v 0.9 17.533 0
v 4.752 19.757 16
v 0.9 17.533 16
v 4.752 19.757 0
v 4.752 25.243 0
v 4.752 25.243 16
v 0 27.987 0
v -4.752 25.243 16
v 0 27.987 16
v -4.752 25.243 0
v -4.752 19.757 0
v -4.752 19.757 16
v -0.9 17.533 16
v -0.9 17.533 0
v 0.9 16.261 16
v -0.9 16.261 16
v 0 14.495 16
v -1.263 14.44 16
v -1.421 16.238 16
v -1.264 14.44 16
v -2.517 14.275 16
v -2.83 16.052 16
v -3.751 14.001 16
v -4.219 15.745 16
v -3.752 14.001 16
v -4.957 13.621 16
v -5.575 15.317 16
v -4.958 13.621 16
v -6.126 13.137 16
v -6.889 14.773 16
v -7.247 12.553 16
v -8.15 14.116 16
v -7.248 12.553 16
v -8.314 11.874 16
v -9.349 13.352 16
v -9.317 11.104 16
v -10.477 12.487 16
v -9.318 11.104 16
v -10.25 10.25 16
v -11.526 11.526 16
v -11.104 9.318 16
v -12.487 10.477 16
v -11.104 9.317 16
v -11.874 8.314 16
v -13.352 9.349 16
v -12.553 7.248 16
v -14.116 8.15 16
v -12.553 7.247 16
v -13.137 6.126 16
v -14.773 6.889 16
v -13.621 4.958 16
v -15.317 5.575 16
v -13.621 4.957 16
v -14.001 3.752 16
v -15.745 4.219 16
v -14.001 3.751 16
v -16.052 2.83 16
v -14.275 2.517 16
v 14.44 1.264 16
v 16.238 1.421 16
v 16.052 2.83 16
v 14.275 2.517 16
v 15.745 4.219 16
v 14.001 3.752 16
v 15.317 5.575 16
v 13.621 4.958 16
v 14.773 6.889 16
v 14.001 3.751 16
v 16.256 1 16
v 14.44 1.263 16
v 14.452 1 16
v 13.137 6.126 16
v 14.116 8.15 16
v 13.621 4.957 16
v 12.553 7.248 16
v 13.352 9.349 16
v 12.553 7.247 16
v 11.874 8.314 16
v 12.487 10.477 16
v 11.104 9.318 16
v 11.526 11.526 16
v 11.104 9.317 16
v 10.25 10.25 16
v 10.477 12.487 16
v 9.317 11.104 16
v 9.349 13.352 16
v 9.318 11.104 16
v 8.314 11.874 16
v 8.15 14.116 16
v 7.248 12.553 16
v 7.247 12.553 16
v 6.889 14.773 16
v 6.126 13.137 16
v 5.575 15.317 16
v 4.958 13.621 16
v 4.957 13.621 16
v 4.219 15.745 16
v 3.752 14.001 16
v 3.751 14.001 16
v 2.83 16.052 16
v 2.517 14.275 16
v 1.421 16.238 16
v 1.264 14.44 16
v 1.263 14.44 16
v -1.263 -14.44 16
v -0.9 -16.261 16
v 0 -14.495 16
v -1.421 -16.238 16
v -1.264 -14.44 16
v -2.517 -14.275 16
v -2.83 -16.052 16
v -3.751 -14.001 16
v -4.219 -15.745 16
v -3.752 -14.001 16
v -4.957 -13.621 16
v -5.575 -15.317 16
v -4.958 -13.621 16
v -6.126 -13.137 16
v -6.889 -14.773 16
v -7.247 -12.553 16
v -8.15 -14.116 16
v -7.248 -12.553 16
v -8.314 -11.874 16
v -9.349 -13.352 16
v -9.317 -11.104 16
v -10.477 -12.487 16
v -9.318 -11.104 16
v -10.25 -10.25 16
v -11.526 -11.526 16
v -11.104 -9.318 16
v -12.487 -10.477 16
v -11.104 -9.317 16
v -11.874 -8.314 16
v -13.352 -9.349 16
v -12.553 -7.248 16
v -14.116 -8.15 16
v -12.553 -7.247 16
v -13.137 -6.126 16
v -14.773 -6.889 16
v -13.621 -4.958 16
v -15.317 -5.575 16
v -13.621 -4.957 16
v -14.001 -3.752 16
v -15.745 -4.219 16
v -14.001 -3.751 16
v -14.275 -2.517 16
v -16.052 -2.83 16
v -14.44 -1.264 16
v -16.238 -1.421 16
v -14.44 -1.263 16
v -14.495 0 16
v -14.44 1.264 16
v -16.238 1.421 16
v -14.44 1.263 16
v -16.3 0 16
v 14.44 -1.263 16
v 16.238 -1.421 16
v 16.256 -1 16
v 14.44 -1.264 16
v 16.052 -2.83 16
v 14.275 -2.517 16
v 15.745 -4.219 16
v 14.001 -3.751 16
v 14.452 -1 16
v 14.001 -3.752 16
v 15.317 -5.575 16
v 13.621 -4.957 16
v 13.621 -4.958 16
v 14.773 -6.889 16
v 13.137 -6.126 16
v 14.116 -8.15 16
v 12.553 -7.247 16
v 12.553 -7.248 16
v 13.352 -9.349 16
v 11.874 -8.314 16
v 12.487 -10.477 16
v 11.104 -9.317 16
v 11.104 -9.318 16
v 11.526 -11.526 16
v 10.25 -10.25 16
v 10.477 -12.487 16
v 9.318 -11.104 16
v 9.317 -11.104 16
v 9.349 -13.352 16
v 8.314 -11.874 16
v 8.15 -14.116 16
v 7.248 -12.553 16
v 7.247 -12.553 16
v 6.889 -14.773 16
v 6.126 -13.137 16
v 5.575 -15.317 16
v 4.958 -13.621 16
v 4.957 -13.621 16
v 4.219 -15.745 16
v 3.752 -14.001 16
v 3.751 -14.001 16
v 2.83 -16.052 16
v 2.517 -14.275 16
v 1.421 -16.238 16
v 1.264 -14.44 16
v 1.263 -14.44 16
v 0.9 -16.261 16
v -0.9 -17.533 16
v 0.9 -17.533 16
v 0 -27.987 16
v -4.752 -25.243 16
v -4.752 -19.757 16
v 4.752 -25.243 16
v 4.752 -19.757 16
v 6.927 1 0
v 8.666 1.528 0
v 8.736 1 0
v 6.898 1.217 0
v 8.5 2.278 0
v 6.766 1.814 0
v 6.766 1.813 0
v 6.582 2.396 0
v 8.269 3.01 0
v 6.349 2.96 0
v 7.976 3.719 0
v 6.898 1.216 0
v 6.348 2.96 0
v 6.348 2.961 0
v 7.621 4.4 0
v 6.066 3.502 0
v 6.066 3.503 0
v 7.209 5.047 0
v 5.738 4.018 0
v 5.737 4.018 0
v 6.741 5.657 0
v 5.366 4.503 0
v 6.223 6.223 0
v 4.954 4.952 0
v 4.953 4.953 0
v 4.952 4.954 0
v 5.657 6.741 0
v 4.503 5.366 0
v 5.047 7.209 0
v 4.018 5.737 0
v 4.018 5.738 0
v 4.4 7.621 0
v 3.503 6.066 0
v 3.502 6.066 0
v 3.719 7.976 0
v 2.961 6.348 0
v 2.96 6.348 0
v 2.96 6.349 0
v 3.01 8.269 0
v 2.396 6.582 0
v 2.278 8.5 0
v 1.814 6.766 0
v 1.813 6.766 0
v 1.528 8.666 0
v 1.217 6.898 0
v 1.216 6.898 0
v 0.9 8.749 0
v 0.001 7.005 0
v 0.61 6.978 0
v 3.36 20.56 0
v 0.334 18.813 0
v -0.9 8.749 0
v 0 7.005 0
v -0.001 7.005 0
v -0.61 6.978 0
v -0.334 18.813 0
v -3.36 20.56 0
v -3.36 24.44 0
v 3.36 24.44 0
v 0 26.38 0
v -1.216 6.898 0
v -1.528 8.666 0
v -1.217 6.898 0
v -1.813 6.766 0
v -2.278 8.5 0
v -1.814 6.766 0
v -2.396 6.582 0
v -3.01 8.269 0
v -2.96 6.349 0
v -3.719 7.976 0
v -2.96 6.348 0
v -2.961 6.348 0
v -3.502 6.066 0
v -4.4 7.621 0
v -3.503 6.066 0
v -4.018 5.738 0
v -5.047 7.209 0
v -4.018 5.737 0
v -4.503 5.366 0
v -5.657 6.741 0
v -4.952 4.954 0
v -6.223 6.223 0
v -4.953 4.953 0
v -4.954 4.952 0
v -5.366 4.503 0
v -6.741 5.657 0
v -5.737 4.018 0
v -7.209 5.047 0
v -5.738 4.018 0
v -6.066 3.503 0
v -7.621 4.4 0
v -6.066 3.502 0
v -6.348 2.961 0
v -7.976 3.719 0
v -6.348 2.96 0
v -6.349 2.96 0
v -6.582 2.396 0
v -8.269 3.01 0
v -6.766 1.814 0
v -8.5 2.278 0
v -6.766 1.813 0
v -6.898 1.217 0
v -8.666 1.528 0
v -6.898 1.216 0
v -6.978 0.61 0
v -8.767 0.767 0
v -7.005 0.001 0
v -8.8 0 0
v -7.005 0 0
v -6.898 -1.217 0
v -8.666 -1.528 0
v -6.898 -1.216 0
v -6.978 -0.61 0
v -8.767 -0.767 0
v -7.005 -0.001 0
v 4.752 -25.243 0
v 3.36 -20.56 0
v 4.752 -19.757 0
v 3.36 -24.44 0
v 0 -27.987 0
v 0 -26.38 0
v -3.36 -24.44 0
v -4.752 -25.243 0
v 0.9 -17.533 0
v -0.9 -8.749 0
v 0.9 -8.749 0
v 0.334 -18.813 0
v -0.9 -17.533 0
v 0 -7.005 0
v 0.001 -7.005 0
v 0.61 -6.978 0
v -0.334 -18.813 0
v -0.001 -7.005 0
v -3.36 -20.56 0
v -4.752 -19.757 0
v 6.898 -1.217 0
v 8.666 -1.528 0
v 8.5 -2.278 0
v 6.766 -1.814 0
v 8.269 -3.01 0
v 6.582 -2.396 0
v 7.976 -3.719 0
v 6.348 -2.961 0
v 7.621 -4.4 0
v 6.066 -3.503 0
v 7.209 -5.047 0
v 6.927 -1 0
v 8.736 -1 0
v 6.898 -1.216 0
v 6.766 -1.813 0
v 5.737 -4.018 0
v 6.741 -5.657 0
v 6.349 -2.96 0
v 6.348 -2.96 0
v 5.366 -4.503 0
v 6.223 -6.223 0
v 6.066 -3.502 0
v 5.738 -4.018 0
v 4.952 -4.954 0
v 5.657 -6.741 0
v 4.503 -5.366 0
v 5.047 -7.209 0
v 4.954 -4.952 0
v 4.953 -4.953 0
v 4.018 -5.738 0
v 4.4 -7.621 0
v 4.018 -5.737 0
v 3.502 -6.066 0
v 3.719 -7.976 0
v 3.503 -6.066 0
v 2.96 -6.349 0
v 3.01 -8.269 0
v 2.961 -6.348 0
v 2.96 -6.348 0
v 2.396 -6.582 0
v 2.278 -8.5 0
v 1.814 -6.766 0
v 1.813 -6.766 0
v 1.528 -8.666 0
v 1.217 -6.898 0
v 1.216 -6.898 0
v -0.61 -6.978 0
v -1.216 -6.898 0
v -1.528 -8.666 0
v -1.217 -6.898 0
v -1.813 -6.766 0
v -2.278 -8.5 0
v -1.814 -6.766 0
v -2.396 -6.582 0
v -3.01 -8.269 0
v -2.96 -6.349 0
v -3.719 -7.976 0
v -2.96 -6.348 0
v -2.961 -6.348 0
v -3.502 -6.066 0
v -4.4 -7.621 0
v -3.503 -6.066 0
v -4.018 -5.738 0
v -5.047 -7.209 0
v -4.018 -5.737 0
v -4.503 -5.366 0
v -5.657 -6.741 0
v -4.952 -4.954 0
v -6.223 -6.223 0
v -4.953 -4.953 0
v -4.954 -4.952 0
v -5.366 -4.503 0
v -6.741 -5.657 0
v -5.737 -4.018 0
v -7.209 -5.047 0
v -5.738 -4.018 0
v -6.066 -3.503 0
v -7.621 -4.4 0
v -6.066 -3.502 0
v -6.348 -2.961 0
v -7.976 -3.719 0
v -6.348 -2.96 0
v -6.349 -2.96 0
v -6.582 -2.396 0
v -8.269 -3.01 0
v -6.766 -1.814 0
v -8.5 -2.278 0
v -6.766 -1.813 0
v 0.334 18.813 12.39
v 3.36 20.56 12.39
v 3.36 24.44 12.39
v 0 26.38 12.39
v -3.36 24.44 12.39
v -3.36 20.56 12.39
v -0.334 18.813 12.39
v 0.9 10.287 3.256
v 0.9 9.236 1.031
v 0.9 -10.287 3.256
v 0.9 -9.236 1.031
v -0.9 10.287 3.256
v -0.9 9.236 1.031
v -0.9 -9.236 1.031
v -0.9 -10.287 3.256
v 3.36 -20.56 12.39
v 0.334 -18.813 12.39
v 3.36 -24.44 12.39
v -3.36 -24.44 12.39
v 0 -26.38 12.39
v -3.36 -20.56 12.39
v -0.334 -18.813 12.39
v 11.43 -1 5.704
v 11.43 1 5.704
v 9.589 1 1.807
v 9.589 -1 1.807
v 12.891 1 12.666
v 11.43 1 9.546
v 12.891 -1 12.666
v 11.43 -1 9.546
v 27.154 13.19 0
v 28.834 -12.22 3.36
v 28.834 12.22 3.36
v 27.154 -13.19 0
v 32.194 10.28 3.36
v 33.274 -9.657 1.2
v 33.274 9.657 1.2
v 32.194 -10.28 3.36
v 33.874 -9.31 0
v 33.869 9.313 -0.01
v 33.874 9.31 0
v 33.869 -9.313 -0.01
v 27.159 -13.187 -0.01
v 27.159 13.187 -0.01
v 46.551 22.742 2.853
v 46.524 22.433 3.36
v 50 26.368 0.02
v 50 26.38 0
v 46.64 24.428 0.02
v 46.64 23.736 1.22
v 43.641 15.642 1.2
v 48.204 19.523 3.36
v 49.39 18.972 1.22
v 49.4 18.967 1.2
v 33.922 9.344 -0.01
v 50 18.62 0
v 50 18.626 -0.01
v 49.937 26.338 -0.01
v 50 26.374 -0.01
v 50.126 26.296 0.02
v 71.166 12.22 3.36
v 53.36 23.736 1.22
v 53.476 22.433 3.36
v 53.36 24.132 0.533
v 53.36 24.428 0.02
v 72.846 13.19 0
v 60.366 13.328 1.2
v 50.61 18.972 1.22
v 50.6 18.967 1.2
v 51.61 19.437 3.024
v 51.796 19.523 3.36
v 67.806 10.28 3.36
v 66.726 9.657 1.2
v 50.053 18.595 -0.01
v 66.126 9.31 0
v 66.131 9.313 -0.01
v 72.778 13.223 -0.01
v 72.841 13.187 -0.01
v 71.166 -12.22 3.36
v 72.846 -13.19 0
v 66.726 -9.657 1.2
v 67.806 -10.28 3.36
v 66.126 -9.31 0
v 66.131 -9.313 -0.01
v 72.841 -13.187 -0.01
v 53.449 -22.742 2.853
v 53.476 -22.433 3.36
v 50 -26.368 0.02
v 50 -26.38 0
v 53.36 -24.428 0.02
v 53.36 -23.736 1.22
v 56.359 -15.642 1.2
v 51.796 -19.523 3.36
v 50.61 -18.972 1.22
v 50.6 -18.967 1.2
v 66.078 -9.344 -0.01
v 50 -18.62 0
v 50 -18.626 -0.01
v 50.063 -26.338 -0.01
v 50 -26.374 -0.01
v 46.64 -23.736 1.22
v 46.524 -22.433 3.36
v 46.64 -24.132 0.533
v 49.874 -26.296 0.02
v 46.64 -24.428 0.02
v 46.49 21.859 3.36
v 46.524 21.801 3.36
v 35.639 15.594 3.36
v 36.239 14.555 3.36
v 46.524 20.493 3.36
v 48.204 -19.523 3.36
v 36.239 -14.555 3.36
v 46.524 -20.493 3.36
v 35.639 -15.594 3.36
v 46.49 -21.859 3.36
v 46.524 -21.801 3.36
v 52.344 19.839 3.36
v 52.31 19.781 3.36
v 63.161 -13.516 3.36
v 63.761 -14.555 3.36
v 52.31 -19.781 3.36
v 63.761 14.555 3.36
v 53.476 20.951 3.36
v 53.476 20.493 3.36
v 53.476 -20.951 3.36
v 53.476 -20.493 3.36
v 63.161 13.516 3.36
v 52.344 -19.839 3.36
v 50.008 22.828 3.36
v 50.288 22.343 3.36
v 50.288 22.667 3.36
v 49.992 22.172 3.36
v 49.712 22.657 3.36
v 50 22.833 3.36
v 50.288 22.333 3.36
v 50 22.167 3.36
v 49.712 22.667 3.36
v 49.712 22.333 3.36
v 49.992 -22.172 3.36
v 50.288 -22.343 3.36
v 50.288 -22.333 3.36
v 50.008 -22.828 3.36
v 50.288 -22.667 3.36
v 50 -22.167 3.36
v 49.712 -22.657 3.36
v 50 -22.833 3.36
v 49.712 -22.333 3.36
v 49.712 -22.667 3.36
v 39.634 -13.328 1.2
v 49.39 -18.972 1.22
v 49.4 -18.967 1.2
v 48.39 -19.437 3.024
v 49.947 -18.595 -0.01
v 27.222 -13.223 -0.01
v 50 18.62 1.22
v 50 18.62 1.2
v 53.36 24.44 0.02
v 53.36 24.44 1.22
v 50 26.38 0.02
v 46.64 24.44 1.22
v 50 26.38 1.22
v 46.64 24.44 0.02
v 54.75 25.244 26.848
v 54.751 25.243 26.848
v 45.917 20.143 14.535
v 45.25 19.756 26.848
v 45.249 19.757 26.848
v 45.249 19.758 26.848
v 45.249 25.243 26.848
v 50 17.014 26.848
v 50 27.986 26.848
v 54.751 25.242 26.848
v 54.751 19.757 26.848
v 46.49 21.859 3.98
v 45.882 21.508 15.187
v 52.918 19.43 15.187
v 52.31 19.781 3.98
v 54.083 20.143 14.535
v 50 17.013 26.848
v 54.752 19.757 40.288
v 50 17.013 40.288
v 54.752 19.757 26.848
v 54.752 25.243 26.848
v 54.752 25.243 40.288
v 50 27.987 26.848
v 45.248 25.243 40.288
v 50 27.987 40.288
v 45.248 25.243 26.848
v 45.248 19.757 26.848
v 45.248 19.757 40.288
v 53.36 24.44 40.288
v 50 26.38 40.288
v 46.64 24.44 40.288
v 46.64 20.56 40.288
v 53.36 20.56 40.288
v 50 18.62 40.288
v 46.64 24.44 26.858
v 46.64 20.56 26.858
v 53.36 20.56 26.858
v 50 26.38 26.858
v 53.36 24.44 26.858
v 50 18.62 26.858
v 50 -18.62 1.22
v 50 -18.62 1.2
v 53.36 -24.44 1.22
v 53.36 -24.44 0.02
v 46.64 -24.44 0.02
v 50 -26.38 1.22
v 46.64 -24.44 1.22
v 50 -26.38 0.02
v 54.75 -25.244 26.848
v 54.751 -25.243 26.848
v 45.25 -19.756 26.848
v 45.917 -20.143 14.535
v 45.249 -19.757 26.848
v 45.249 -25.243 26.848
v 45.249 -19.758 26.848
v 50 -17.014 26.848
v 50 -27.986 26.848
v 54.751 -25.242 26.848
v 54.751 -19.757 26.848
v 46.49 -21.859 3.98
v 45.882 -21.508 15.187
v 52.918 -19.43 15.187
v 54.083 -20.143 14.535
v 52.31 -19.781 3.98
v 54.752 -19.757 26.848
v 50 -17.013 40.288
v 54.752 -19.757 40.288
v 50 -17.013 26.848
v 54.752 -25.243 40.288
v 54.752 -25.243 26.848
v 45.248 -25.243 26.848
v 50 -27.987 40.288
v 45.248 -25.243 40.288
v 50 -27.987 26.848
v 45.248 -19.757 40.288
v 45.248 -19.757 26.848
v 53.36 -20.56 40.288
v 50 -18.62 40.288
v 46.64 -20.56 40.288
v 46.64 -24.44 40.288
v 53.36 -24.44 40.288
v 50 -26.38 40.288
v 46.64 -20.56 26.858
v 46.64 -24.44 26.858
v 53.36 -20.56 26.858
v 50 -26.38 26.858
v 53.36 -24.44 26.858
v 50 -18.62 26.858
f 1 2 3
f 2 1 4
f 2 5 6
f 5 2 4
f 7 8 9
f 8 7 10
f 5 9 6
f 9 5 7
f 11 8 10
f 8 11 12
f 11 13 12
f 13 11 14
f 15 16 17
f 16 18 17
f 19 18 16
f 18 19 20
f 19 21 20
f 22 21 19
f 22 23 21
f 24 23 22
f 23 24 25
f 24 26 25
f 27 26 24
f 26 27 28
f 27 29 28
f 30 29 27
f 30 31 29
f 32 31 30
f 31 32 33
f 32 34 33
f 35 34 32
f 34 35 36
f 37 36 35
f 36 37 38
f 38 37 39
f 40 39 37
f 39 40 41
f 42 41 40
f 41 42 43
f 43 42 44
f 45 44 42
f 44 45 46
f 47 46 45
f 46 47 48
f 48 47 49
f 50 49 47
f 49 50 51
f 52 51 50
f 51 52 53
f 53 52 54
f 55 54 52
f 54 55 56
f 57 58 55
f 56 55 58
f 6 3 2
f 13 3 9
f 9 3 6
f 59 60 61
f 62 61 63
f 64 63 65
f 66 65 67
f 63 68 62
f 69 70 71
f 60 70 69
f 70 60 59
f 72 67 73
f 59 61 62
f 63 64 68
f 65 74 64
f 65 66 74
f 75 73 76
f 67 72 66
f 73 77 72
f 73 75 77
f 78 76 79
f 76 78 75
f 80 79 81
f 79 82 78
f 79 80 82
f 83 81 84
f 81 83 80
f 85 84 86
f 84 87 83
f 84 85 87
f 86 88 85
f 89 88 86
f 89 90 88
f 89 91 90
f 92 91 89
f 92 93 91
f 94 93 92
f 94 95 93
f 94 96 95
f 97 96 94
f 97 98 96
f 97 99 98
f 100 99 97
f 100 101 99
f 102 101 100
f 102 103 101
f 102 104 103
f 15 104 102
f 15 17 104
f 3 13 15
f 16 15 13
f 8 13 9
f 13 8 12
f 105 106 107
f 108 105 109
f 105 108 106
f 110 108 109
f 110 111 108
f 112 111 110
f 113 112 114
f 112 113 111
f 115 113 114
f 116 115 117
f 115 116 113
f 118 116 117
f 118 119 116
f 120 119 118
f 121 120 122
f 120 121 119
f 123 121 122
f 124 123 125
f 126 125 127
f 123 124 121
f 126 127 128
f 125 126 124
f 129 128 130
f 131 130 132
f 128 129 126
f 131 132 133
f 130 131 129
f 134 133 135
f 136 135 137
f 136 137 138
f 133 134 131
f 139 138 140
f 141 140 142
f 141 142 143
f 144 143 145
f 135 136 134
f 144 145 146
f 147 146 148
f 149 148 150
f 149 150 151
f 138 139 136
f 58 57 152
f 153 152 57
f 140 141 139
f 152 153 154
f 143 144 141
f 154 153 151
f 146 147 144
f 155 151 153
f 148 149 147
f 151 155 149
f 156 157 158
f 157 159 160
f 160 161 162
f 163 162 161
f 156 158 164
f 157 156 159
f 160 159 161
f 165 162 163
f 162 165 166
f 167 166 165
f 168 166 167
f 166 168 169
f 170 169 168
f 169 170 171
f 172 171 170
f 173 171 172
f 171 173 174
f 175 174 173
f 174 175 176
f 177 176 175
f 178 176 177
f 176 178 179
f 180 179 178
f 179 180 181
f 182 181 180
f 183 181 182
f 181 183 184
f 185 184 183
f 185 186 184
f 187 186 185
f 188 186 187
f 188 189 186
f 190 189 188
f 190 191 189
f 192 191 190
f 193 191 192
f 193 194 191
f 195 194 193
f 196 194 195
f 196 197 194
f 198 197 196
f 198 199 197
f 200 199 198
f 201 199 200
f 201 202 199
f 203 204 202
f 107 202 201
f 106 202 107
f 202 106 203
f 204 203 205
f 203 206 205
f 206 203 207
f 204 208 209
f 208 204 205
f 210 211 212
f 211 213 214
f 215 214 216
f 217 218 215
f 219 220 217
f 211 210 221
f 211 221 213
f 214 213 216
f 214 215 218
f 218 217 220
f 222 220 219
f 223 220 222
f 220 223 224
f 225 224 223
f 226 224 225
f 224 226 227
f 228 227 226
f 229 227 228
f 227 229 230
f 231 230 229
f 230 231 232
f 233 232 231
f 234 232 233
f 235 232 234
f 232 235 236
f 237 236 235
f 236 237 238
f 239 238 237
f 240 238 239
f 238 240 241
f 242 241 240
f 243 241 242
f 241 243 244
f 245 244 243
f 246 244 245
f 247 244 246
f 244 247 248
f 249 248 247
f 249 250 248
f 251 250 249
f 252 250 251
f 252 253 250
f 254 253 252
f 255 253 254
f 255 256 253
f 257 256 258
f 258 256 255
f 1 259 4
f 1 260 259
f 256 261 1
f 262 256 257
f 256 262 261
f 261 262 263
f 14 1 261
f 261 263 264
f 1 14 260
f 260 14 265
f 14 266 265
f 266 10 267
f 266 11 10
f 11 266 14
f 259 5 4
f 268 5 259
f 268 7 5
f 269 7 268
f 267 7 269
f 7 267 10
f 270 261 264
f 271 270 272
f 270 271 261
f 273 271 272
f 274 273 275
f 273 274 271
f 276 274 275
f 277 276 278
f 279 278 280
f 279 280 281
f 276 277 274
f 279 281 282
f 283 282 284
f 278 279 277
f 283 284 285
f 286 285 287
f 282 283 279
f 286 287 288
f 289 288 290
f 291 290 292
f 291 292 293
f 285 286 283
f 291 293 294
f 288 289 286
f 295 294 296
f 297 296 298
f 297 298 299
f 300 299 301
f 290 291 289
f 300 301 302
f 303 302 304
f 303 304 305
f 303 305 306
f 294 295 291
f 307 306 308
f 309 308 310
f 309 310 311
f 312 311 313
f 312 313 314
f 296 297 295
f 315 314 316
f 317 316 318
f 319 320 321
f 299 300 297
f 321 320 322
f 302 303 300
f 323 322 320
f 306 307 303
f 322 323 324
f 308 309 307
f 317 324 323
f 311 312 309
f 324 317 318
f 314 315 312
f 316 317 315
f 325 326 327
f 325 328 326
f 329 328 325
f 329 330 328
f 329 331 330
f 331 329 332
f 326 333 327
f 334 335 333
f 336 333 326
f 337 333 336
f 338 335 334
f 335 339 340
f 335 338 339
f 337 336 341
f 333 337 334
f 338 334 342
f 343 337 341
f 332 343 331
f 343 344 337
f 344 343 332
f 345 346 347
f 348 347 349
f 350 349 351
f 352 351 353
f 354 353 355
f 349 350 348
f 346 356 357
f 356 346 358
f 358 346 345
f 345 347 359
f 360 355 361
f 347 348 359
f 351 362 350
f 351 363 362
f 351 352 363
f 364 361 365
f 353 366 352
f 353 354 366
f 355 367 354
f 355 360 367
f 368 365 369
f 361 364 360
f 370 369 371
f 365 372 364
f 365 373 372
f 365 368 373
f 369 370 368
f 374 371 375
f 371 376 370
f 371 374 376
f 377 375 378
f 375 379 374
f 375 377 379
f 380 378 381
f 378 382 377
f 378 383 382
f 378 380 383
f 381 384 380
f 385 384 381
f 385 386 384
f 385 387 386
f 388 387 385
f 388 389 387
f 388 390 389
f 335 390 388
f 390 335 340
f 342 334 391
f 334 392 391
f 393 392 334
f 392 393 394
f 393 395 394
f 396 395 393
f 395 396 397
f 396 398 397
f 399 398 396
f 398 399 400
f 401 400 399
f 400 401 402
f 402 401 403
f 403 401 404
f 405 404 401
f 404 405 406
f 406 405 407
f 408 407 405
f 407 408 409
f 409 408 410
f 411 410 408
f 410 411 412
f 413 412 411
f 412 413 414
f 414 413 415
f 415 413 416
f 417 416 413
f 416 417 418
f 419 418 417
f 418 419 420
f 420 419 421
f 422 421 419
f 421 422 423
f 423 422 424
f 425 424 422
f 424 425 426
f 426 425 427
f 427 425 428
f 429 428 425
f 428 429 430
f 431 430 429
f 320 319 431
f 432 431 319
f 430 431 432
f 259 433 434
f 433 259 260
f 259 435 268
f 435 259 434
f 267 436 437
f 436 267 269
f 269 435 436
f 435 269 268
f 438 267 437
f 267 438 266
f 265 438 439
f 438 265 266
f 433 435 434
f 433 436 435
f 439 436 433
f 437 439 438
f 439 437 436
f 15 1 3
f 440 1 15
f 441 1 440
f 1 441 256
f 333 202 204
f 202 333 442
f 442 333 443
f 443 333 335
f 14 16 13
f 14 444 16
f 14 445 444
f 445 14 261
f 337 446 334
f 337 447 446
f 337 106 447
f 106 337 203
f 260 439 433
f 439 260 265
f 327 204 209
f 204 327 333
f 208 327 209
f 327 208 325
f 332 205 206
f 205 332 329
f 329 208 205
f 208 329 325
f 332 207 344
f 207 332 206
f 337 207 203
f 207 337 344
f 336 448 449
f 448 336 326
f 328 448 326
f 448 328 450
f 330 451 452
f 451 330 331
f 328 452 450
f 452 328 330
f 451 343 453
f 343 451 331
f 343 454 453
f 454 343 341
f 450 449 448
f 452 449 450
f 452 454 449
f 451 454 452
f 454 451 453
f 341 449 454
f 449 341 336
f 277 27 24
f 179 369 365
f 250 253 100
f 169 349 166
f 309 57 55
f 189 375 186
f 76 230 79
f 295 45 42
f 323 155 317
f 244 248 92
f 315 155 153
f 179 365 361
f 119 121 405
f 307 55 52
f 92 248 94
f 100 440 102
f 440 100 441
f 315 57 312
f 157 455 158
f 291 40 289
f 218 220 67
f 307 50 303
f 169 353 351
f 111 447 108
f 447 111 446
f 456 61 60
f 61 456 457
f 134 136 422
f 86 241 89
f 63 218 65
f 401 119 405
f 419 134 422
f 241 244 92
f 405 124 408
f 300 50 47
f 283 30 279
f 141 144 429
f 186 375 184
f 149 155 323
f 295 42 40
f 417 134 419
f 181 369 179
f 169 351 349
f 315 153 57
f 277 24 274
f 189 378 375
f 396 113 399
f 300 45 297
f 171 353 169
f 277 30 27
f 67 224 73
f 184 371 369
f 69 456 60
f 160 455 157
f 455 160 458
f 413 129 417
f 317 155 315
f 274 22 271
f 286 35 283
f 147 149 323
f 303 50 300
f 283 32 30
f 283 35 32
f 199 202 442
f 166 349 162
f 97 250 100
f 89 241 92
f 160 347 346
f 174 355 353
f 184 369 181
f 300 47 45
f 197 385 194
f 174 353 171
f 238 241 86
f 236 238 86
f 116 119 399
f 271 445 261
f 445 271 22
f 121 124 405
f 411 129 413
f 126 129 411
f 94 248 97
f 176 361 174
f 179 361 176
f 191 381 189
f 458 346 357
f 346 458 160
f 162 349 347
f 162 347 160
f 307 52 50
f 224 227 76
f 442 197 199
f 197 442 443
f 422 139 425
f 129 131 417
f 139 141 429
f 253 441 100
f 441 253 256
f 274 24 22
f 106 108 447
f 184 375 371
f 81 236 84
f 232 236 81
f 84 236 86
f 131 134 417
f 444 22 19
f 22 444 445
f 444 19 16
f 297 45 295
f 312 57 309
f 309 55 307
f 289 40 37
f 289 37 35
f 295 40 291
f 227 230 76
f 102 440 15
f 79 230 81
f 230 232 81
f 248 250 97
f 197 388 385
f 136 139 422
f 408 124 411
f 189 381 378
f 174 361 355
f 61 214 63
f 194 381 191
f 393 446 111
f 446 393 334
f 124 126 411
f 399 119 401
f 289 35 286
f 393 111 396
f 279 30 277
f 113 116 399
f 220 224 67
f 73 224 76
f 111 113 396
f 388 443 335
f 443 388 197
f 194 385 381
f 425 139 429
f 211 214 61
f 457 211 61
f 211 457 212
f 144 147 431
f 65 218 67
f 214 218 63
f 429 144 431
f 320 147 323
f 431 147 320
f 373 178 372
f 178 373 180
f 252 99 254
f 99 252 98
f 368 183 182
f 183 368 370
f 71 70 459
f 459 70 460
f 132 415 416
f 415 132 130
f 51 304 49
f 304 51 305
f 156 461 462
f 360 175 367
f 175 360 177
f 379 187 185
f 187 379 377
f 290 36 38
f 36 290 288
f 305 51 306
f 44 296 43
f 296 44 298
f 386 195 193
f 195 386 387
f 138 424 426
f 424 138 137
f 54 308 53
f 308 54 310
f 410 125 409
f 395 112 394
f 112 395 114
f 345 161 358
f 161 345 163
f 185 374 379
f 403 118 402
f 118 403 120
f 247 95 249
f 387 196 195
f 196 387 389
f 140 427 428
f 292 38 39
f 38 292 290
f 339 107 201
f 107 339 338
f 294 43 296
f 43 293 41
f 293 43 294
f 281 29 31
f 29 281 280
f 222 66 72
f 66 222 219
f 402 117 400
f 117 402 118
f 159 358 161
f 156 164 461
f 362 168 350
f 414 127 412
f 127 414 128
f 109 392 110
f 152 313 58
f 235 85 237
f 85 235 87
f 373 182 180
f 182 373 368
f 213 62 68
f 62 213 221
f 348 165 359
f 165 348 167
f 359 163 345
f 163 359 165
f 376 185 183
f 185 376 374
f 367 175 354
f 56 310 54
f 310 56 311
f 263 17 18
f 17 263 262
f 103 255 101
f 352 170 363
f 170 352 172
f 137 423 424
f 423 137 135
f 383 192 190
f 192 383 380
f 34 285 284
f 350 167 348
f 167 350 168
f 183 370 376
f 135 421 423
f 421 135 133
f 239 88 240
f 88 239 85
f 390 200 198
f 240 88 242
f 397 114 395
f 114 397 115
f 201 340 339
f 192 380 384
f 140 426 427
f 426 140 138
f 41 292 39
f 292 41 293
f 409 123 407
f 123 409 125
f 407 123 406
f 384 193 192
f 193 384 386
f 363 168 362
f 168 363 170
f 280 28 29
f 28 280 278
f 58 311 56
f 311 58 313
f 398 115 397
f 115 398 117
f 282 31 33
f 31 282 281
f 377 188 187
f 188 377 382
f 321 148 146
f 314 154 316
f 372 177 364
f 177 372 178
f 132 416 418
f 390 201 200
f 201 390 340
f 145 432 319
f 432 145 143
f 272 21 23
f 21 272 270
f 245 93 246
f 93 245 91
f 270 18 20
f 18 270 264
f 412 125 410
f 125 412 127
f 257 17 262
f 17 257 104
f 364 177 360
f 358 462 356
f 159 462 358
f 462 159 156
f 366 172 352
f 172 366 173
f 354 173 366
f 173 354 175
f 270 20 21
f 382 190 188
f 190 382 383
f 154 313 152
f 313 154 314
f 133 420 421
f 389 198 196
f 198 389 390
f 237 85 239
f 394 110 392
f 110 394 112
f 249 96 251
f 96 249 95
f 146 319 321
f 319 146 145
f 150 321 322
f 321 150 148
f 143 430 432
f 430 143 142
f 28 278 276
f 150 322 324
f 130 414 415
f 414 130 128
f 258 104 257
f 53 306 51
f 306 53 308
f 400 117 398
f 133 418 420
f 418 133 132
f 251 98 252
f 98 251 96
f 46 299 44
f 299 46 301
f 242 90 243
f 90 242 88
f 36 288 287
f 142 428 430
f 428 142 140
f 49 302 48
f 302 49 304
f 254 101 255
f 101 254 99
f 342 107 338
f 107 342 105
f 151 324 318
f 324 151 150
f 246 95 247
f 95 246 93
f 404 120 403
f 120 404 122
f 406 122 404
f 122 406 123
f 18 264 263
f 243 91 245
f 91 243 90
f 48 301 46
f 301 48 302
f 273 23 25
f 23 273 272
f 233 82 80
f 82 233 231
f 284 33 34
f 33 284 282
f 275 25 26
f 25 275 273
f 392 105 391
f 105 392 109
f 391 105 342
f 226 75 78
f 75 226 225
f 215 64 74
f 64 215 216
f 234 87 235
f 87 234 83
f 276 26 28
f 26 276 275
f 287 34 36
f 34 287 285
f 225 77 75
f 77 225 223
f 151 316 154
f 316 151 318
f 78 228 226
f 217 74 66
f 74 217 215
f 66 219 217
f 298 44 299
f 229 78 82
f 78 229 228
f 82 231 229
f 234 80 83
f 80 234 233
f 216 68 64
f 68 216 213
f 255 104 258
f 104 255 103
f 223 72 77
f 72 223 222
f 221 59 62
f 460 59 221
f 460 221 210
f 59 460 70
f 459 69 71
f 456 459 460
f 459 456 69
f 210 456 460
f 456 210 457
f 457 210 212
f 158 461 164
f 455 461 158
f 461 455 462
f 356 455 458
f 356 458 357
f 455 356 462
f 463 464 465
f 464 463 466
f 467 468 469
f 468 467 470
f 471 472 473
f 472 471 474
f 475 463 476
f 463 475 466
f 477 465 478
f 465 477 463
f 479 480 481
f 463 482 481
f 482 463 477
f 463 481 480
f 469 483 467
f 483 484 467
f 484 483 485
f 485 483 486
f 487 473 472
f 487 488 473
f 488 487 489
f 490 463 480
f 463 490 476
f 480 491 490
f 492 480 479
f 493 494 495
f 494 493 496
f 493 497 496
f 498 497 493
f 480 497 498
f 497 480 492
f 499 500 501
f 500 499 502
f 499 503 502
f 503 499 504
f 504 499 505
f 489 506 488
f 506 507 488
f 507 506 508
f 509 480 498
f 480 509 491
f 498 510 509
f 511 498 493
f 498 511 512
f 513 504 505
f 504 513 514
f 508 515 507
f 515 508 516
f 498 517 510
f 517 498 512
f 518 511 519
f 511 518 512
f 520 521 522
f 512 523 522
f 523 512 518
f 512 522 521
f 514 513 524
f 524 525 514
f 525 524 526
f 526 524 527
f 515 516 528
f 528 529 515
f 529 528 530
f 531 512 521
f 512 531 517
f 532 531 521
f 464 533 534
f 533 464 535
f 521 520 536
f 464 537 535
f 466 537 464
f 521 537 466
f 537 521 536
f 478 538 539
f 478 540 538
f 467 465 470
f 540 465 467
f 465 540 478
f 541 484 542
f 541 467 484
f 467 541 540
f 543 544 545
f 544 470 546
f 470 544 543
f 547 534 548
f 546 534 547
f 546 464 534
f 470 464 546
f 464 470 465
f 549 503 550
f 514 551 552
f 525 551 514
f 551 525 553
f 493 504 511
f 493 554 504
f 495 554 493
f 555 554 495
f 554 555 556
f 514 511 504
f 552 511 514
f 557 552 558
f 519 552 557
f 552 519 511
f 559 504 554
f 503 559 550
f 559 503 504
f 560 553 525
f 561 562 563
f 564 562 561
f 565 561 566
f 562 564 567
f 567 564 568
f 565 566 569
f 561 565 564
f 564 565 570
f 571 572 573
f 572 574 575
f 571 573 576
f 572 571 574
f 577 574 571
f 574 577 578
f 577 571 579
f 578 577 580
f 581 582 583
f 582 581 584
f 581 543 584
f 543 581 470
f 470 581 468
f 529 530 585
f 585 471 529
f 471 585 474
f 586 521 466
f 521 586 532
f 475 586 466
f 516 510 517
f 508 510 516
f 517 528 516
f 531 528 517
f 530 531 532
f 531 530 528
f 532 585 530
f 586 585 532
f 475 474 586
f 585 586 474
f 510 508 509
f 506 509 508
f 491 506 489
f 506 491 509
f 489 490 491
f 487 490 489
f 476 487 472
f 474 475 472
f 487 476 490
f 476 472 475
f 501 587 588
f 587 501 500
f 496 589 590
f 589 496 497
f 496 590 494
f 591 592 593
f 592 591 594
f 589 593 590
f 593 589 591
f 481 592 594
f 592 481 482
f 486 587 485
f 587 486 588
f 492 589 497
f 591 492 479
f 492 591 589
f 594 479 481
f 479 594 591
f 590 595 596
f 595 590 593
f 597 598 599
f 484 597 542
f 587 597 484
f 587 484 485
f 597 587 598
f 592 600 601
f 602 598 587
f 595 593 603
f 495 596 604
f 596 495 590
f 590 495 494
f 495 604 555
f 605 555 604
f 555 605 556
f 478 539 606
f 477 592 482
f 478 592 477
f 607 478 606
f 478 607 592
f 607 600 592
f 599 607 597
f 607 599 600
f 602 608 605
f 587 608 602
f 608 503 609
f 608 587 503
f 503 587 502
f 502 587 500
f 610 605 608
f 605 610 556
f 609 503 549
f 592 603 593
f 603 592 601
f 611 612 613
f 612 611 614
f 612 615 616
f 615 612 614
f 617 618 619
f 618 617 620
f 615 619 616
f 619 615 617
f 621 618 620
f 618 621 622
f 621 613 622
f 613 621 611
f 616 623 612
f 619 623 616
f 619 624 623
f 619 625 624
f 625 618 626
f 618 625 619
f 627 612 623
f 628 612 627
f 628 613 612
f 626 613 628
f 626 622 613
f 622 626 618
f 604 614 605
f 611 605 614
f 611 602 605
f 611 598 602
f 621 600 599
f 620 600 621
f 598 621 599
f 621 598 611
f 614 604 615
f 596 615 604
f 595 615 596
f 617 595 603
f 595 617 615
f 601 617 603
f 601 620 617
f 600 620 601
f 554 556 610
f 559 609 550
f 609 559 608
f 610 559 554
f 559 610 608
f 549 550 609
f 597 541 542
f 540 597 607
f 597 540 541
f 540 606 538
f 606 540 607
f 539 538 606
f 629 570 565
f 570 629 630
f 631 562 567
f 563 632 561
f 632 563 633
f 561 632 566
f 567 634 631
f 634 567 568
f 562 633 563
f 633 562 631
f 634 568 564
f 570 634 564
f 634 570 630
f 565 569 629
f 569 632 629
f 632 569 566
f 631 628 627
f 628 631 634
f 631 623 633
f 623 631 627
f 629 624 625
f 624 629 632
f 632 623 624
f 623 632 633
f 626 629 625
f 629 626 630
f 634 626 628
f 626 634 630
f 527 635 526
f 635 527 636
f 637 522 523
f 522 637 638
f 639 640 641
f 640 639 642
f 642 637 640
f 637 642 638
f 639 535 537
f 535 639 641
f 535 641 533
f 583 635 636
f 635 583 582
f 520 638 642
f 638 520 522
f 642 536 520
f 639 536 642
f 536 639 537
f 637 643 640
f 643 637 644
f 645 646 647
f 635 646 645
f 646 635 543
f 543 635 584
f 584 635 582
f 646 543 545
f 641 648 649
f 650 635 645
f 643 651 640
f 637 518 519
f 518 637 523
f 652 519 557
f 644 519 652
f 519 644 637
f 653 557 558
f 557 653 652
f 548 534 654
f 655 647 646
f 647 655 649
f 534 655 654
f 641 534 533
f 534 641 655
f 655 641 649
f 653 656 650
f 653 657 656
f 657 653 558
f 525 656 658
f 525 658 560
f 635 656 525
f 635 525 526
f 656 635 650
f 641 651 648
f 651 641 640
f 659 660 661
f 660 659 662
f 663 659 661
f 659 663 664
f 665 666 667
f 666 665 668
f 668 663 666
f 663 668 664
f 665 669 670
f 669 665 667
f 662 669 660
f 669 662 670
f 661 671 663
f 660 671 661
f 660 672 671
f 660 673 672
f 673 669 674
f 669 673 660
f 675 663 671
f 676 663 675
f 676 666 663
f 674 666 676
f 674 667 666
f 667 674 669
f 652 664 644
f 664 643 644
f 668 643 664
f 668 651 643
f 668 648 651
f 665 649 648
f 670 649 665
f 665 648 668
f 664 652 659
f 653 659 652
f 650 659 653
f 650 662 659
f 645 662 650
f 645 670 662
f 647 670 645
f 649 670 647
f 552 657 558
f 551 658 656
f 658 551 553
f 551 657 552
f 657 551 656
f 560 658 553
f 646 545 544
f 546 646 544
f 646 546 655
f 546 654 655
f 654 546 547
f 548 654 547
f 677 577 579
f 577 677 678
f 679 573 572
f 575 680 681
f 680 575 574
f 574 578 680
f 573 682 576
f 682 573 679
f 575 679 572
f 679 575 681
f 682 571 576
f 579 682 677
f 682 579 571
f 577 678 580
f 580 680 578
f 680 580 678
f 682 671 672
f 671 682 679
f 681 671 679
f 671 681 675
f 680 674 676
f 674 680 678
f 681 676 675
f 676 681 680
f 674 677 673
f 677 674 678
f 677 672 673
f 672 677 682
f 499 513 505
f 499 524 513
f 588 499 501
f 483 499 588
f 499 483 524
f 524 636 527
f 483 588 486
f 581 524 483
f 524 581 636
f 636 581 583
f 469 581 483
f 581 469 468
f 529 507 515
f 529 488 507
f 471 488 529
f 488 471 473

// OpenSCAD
// -*- mode: SCAD ; c-file-style: "ellemtel" ; coding: utf-8 -*-
//
// A stand for my (Severin) milk frother.
//
// © 2018–2019 Roland Sieker <ospalh@gmail.com>
// Licence: CC-BY-SA 4.0

/* [Global] */

// … to preview. You will get all parts as separate STLs when you click “Create Thing”.
part = "s"; // [s: set, a: upper holder, b: base, t: test, st: stack]

// Set this to “render” and click on “Create Thing” when done with the setup.
preview = 1; // [0:render, 1:preview]

/* [Sizes] */

// lower diameter
d_1 = 14;  // [5:0.5:40]

// higher diameter
d_2 = 29;  // [5:0.5:40]

// hight of the holder bar
h = 16;   // [10:0.1:40]

// diameter of the milk frother itself
d_mf = 45; // [30:1:80]

// diameter of the gap for the axle
d_a = 2;  // [1:0.25:4]

/* [Hidden] */

// Done with the customizer

// *******************************************************
// Extra parameters. These can be changed reasonably safely.


w = 1.8;  // Wall width
p = 1.2;  // Bottom, top plate hight
c = 0.4;  // Clearance
angle = 60; // Overhangs much below 60° are a problem for me

// *******************************************************
// Some shortcuts. These shouldn’t be changed


module kmirror(maxis=[1, 0, 0])
{
   // Keep *and* mirror an object. Standard is left and right mirroring.
   children();
   mirror(maxis)
   {
      children();
   }
}

r_mf = d_mf/2;
es_h = 12; // Extra support/stabilizer hight


tau = 2 * PI;  // π is still wrong. τ = circumference / r

xy_factor = 1/tan(angle);
// To get from a hight to a horizontal width inclined correctly
z_factor = tan(angle);  // The other way around


wiggle_room_factor = 1.05;

// The small radius of the support pencil, from center to center of face
r_p_s = 3.2 * wiggle_room_factor;
// The flat-to-flat diameter of a standard pencil is 6.4 mm. Do quite a
// bit more.
// The max. radius (center to edge).  Also the
// width of one pencil face.
r_p_l = r_p_s * 2 / 3 * sqrt(3);

// Used to calculate how heigh the lug that holds the handle is

// Tip angle
tip_a = 21;  // °. Apparently standard in Germany
// tip_a = 19;  // °. There is a German »Long Point« pencil sharpnener with 19 °.
// There are also rumors that American pencil are pointier than German ones.
// tip_a = 24 // °. Special color pencil sharpener.

// The tip angle is apparently from one side to the other side, not from
// one side to the center line.


// Size of the “big pencil” connector. Twice the area, half of it hollow.
r_bp_s = sqrt(2) * r_p_s;
r_bp_l = r_bp_s * 2 / 3 * sqrt(3);

sp_h = 4 * r_p_s;  // Hight of the sharpend pencil cylindrical connector bit
usp_h = 10 * r_p_s;  // Hight of the unsharpend pencil connector bit

// hex_r = r_mf + r_bp_l;
r_red = r_mf - r_bp_l;

bp_s_h = r_bp_s / tan(tip_a/2);


some_distance = 50;
ms = 0.01;  // Muggeseggele.

// fn for differently sized objects and fs, fa; all for preview or rendering.
pna = 40;
pnb = 15;
pa = 5;
ps = 1;
rna = 180;
rnb = 30;
ra = 2;
rs = 0.25;
function na() = (preview) ? pna : rna;
function nb() = (preview) ? pnb : rnb;
$fs = (preview) ? ps : rs;
$fa = (preview) ? pa : ra;

// *******************************************************
// End setup



// *******************************************************
// Generate the parts

print_part();


if ("s" == part)
{
   preview_parts();
}


if ("t" == part)
{
   holder_support();
}

if ("st" == part)
{
   // Use "st" during development
   stack_parts();
}

module print_part()
{
   if ("a" == part)
   {
      upholder();
   }
   if ("b" == part)
   {
      base();
   }
}

module preview_parts()
{
   upholder();
   translate([some_distance, 0, 0])
   {
      base();
   }
}

module stack_parts()
{
   // intersection()
   {
      translate([0,0,30])
      {
         color("yellow")
         {
            upholder();
         }
      }
      color("red")
      {
         base();
      }
   }
}

// *******************************************************
// Code for the parts themselves


module base()
{
   difference()
   {
      union()
      {
         // Construct the stand ring symmetric to xy plane …
         rotate(30)
         {
            rotate_extrude($fn=6)
            {
               translate([r_mf, 0, 0])
               {
                  circle(r=r_p_l, $fn=6);
               }
            }
         }
      }
      // … and subtract everything below the xy plane.
      translate([0,0,-some_distance-ms])
      {
         cylinder(r=some_distance, h=some_distance);
      }
   }
   // Fill the base plate
   rotate(30)
   {
      cylinder(r=r_mf, h=p, $fn=6);
   }
   translate([0,0,2*ms])
   {
      kmirror([0,1,0])
      {
         translate([0, r_mf, 0])
         {

            rotate(30)
            {
               difference()
               {
                  union()
                  {
                     cylinder(h=p+h, r=r_p_l, $fn=6);
                     translate([0,0,p])
                     {
                        cylinder(h=bp_s_h, r1=r_p_l, r2=r_bp_l,$fn=6);
                     }
                     // The shaft bit
                     translate([0, 0 , bp_s_h+p+-ms])
                     {
                        cylinder(h=sp_h, r=r_bp_l, $fn=6);
                     }
                     // The extra plates. Should not interfere with the stand
                     // without this. Anyway.
                     rotate(-60)
                     {
                        extra_plate();
                     }
                     rotate(180)
                     {
                        extra_plate();
                     }
                  }
                  // Hollow it out
                  translate([0,0,p])
                  {
                     cylinder(h=bp_s_h, r1=ms, r2=r_p_l, $fn=6);
                  }
                  translate([0, 0 , bp_s_h+p])
                  {
                     cylinder(h=sp_h+1,r=r_p_l, $fn=6);
                  }
               }
            }
         }
      }
   }
}

module base_holder()
{
   translate([0, r_mf, 0])
   {

      rotate(30)
      {
         difference()
         {
            union()
            {
               cylinder(h=bp_s_h, r1=r_p_l, r2=r_bp_l,$fn=6);
               // The shaft bit
               translate([0, 0 , bp_s_h-ms])
               {
                  cylinder(h=sp_h, r=r_bp_l, $fn=6);
               }
               // The extra plates. Should not interfere with the stand
               // without this. Anyway.
               rotate(-60)
               {
                  extra_plate();
               }
               rotate(180)
               {
                  extra_plate();
               }
            }
            // Hollow it out
            cylinder(h=bp_s_h, r1=0, r2=r_p_l, $fn=6);
            translate([0, 0 , bp_s_h])
            {
               cylinder(h=sp_h+1,r=r_p_l, $fn=6);
            }

         }
      }
   }

}

module extra_plate()
{
   es_s_p = [
      [0, 0],
      [es_h + r_p_l/2-ms, 0],
      [0, es_h + r_p_l/2-ms]
      ];
   rotate([90, 0, 0])
   {
      translate([r_p_s, 0.5*r_p_l, 0])
      {
         linear_extrude(p)
         {
            polygon(es_s_p);
         }
      }
   }
}


module upholder()
{
   difference()
   {
      union()
      {
         filled_holder();
         holder_arm();
      }
      holder_hollow();
   }
}

module filled_holder()
{
   cylinder(r1=d_1/2+w, r2=d_2/2+w, h=h);
}

module holder_arm()
{
   kmirror([0,1,0])
   {
      holder_support();
   }
}

module holder_support()
{
   bp_s_f = (r_bp_l) / r_p_l;
   translate([0,r_mf, 0])
   {
      rotate(30)
      {
         difference()
         {
            cylinder(h=h, r=r_bp_l, $fn=6);
            // Hollow it out
            translate([0,0, -ms])
            {
               cylinder(h=h-3*p, r=r_p_l, $fn=6);
            }
         }
      }
   }
   translate([-w/2, 0, 0])
   {
      cube([w,r_red+w,h]);
   }
}

module holder_hollow()
{
   translate([0,0,-ms])
   {
      cylinder(r1=d_1/2, r2=d_2/2, h=h+2*ms);
      translate([0, -d_a/2,0])
      {
         cube([d_2, d_a, h+2*ms]);
      }
   }

}
